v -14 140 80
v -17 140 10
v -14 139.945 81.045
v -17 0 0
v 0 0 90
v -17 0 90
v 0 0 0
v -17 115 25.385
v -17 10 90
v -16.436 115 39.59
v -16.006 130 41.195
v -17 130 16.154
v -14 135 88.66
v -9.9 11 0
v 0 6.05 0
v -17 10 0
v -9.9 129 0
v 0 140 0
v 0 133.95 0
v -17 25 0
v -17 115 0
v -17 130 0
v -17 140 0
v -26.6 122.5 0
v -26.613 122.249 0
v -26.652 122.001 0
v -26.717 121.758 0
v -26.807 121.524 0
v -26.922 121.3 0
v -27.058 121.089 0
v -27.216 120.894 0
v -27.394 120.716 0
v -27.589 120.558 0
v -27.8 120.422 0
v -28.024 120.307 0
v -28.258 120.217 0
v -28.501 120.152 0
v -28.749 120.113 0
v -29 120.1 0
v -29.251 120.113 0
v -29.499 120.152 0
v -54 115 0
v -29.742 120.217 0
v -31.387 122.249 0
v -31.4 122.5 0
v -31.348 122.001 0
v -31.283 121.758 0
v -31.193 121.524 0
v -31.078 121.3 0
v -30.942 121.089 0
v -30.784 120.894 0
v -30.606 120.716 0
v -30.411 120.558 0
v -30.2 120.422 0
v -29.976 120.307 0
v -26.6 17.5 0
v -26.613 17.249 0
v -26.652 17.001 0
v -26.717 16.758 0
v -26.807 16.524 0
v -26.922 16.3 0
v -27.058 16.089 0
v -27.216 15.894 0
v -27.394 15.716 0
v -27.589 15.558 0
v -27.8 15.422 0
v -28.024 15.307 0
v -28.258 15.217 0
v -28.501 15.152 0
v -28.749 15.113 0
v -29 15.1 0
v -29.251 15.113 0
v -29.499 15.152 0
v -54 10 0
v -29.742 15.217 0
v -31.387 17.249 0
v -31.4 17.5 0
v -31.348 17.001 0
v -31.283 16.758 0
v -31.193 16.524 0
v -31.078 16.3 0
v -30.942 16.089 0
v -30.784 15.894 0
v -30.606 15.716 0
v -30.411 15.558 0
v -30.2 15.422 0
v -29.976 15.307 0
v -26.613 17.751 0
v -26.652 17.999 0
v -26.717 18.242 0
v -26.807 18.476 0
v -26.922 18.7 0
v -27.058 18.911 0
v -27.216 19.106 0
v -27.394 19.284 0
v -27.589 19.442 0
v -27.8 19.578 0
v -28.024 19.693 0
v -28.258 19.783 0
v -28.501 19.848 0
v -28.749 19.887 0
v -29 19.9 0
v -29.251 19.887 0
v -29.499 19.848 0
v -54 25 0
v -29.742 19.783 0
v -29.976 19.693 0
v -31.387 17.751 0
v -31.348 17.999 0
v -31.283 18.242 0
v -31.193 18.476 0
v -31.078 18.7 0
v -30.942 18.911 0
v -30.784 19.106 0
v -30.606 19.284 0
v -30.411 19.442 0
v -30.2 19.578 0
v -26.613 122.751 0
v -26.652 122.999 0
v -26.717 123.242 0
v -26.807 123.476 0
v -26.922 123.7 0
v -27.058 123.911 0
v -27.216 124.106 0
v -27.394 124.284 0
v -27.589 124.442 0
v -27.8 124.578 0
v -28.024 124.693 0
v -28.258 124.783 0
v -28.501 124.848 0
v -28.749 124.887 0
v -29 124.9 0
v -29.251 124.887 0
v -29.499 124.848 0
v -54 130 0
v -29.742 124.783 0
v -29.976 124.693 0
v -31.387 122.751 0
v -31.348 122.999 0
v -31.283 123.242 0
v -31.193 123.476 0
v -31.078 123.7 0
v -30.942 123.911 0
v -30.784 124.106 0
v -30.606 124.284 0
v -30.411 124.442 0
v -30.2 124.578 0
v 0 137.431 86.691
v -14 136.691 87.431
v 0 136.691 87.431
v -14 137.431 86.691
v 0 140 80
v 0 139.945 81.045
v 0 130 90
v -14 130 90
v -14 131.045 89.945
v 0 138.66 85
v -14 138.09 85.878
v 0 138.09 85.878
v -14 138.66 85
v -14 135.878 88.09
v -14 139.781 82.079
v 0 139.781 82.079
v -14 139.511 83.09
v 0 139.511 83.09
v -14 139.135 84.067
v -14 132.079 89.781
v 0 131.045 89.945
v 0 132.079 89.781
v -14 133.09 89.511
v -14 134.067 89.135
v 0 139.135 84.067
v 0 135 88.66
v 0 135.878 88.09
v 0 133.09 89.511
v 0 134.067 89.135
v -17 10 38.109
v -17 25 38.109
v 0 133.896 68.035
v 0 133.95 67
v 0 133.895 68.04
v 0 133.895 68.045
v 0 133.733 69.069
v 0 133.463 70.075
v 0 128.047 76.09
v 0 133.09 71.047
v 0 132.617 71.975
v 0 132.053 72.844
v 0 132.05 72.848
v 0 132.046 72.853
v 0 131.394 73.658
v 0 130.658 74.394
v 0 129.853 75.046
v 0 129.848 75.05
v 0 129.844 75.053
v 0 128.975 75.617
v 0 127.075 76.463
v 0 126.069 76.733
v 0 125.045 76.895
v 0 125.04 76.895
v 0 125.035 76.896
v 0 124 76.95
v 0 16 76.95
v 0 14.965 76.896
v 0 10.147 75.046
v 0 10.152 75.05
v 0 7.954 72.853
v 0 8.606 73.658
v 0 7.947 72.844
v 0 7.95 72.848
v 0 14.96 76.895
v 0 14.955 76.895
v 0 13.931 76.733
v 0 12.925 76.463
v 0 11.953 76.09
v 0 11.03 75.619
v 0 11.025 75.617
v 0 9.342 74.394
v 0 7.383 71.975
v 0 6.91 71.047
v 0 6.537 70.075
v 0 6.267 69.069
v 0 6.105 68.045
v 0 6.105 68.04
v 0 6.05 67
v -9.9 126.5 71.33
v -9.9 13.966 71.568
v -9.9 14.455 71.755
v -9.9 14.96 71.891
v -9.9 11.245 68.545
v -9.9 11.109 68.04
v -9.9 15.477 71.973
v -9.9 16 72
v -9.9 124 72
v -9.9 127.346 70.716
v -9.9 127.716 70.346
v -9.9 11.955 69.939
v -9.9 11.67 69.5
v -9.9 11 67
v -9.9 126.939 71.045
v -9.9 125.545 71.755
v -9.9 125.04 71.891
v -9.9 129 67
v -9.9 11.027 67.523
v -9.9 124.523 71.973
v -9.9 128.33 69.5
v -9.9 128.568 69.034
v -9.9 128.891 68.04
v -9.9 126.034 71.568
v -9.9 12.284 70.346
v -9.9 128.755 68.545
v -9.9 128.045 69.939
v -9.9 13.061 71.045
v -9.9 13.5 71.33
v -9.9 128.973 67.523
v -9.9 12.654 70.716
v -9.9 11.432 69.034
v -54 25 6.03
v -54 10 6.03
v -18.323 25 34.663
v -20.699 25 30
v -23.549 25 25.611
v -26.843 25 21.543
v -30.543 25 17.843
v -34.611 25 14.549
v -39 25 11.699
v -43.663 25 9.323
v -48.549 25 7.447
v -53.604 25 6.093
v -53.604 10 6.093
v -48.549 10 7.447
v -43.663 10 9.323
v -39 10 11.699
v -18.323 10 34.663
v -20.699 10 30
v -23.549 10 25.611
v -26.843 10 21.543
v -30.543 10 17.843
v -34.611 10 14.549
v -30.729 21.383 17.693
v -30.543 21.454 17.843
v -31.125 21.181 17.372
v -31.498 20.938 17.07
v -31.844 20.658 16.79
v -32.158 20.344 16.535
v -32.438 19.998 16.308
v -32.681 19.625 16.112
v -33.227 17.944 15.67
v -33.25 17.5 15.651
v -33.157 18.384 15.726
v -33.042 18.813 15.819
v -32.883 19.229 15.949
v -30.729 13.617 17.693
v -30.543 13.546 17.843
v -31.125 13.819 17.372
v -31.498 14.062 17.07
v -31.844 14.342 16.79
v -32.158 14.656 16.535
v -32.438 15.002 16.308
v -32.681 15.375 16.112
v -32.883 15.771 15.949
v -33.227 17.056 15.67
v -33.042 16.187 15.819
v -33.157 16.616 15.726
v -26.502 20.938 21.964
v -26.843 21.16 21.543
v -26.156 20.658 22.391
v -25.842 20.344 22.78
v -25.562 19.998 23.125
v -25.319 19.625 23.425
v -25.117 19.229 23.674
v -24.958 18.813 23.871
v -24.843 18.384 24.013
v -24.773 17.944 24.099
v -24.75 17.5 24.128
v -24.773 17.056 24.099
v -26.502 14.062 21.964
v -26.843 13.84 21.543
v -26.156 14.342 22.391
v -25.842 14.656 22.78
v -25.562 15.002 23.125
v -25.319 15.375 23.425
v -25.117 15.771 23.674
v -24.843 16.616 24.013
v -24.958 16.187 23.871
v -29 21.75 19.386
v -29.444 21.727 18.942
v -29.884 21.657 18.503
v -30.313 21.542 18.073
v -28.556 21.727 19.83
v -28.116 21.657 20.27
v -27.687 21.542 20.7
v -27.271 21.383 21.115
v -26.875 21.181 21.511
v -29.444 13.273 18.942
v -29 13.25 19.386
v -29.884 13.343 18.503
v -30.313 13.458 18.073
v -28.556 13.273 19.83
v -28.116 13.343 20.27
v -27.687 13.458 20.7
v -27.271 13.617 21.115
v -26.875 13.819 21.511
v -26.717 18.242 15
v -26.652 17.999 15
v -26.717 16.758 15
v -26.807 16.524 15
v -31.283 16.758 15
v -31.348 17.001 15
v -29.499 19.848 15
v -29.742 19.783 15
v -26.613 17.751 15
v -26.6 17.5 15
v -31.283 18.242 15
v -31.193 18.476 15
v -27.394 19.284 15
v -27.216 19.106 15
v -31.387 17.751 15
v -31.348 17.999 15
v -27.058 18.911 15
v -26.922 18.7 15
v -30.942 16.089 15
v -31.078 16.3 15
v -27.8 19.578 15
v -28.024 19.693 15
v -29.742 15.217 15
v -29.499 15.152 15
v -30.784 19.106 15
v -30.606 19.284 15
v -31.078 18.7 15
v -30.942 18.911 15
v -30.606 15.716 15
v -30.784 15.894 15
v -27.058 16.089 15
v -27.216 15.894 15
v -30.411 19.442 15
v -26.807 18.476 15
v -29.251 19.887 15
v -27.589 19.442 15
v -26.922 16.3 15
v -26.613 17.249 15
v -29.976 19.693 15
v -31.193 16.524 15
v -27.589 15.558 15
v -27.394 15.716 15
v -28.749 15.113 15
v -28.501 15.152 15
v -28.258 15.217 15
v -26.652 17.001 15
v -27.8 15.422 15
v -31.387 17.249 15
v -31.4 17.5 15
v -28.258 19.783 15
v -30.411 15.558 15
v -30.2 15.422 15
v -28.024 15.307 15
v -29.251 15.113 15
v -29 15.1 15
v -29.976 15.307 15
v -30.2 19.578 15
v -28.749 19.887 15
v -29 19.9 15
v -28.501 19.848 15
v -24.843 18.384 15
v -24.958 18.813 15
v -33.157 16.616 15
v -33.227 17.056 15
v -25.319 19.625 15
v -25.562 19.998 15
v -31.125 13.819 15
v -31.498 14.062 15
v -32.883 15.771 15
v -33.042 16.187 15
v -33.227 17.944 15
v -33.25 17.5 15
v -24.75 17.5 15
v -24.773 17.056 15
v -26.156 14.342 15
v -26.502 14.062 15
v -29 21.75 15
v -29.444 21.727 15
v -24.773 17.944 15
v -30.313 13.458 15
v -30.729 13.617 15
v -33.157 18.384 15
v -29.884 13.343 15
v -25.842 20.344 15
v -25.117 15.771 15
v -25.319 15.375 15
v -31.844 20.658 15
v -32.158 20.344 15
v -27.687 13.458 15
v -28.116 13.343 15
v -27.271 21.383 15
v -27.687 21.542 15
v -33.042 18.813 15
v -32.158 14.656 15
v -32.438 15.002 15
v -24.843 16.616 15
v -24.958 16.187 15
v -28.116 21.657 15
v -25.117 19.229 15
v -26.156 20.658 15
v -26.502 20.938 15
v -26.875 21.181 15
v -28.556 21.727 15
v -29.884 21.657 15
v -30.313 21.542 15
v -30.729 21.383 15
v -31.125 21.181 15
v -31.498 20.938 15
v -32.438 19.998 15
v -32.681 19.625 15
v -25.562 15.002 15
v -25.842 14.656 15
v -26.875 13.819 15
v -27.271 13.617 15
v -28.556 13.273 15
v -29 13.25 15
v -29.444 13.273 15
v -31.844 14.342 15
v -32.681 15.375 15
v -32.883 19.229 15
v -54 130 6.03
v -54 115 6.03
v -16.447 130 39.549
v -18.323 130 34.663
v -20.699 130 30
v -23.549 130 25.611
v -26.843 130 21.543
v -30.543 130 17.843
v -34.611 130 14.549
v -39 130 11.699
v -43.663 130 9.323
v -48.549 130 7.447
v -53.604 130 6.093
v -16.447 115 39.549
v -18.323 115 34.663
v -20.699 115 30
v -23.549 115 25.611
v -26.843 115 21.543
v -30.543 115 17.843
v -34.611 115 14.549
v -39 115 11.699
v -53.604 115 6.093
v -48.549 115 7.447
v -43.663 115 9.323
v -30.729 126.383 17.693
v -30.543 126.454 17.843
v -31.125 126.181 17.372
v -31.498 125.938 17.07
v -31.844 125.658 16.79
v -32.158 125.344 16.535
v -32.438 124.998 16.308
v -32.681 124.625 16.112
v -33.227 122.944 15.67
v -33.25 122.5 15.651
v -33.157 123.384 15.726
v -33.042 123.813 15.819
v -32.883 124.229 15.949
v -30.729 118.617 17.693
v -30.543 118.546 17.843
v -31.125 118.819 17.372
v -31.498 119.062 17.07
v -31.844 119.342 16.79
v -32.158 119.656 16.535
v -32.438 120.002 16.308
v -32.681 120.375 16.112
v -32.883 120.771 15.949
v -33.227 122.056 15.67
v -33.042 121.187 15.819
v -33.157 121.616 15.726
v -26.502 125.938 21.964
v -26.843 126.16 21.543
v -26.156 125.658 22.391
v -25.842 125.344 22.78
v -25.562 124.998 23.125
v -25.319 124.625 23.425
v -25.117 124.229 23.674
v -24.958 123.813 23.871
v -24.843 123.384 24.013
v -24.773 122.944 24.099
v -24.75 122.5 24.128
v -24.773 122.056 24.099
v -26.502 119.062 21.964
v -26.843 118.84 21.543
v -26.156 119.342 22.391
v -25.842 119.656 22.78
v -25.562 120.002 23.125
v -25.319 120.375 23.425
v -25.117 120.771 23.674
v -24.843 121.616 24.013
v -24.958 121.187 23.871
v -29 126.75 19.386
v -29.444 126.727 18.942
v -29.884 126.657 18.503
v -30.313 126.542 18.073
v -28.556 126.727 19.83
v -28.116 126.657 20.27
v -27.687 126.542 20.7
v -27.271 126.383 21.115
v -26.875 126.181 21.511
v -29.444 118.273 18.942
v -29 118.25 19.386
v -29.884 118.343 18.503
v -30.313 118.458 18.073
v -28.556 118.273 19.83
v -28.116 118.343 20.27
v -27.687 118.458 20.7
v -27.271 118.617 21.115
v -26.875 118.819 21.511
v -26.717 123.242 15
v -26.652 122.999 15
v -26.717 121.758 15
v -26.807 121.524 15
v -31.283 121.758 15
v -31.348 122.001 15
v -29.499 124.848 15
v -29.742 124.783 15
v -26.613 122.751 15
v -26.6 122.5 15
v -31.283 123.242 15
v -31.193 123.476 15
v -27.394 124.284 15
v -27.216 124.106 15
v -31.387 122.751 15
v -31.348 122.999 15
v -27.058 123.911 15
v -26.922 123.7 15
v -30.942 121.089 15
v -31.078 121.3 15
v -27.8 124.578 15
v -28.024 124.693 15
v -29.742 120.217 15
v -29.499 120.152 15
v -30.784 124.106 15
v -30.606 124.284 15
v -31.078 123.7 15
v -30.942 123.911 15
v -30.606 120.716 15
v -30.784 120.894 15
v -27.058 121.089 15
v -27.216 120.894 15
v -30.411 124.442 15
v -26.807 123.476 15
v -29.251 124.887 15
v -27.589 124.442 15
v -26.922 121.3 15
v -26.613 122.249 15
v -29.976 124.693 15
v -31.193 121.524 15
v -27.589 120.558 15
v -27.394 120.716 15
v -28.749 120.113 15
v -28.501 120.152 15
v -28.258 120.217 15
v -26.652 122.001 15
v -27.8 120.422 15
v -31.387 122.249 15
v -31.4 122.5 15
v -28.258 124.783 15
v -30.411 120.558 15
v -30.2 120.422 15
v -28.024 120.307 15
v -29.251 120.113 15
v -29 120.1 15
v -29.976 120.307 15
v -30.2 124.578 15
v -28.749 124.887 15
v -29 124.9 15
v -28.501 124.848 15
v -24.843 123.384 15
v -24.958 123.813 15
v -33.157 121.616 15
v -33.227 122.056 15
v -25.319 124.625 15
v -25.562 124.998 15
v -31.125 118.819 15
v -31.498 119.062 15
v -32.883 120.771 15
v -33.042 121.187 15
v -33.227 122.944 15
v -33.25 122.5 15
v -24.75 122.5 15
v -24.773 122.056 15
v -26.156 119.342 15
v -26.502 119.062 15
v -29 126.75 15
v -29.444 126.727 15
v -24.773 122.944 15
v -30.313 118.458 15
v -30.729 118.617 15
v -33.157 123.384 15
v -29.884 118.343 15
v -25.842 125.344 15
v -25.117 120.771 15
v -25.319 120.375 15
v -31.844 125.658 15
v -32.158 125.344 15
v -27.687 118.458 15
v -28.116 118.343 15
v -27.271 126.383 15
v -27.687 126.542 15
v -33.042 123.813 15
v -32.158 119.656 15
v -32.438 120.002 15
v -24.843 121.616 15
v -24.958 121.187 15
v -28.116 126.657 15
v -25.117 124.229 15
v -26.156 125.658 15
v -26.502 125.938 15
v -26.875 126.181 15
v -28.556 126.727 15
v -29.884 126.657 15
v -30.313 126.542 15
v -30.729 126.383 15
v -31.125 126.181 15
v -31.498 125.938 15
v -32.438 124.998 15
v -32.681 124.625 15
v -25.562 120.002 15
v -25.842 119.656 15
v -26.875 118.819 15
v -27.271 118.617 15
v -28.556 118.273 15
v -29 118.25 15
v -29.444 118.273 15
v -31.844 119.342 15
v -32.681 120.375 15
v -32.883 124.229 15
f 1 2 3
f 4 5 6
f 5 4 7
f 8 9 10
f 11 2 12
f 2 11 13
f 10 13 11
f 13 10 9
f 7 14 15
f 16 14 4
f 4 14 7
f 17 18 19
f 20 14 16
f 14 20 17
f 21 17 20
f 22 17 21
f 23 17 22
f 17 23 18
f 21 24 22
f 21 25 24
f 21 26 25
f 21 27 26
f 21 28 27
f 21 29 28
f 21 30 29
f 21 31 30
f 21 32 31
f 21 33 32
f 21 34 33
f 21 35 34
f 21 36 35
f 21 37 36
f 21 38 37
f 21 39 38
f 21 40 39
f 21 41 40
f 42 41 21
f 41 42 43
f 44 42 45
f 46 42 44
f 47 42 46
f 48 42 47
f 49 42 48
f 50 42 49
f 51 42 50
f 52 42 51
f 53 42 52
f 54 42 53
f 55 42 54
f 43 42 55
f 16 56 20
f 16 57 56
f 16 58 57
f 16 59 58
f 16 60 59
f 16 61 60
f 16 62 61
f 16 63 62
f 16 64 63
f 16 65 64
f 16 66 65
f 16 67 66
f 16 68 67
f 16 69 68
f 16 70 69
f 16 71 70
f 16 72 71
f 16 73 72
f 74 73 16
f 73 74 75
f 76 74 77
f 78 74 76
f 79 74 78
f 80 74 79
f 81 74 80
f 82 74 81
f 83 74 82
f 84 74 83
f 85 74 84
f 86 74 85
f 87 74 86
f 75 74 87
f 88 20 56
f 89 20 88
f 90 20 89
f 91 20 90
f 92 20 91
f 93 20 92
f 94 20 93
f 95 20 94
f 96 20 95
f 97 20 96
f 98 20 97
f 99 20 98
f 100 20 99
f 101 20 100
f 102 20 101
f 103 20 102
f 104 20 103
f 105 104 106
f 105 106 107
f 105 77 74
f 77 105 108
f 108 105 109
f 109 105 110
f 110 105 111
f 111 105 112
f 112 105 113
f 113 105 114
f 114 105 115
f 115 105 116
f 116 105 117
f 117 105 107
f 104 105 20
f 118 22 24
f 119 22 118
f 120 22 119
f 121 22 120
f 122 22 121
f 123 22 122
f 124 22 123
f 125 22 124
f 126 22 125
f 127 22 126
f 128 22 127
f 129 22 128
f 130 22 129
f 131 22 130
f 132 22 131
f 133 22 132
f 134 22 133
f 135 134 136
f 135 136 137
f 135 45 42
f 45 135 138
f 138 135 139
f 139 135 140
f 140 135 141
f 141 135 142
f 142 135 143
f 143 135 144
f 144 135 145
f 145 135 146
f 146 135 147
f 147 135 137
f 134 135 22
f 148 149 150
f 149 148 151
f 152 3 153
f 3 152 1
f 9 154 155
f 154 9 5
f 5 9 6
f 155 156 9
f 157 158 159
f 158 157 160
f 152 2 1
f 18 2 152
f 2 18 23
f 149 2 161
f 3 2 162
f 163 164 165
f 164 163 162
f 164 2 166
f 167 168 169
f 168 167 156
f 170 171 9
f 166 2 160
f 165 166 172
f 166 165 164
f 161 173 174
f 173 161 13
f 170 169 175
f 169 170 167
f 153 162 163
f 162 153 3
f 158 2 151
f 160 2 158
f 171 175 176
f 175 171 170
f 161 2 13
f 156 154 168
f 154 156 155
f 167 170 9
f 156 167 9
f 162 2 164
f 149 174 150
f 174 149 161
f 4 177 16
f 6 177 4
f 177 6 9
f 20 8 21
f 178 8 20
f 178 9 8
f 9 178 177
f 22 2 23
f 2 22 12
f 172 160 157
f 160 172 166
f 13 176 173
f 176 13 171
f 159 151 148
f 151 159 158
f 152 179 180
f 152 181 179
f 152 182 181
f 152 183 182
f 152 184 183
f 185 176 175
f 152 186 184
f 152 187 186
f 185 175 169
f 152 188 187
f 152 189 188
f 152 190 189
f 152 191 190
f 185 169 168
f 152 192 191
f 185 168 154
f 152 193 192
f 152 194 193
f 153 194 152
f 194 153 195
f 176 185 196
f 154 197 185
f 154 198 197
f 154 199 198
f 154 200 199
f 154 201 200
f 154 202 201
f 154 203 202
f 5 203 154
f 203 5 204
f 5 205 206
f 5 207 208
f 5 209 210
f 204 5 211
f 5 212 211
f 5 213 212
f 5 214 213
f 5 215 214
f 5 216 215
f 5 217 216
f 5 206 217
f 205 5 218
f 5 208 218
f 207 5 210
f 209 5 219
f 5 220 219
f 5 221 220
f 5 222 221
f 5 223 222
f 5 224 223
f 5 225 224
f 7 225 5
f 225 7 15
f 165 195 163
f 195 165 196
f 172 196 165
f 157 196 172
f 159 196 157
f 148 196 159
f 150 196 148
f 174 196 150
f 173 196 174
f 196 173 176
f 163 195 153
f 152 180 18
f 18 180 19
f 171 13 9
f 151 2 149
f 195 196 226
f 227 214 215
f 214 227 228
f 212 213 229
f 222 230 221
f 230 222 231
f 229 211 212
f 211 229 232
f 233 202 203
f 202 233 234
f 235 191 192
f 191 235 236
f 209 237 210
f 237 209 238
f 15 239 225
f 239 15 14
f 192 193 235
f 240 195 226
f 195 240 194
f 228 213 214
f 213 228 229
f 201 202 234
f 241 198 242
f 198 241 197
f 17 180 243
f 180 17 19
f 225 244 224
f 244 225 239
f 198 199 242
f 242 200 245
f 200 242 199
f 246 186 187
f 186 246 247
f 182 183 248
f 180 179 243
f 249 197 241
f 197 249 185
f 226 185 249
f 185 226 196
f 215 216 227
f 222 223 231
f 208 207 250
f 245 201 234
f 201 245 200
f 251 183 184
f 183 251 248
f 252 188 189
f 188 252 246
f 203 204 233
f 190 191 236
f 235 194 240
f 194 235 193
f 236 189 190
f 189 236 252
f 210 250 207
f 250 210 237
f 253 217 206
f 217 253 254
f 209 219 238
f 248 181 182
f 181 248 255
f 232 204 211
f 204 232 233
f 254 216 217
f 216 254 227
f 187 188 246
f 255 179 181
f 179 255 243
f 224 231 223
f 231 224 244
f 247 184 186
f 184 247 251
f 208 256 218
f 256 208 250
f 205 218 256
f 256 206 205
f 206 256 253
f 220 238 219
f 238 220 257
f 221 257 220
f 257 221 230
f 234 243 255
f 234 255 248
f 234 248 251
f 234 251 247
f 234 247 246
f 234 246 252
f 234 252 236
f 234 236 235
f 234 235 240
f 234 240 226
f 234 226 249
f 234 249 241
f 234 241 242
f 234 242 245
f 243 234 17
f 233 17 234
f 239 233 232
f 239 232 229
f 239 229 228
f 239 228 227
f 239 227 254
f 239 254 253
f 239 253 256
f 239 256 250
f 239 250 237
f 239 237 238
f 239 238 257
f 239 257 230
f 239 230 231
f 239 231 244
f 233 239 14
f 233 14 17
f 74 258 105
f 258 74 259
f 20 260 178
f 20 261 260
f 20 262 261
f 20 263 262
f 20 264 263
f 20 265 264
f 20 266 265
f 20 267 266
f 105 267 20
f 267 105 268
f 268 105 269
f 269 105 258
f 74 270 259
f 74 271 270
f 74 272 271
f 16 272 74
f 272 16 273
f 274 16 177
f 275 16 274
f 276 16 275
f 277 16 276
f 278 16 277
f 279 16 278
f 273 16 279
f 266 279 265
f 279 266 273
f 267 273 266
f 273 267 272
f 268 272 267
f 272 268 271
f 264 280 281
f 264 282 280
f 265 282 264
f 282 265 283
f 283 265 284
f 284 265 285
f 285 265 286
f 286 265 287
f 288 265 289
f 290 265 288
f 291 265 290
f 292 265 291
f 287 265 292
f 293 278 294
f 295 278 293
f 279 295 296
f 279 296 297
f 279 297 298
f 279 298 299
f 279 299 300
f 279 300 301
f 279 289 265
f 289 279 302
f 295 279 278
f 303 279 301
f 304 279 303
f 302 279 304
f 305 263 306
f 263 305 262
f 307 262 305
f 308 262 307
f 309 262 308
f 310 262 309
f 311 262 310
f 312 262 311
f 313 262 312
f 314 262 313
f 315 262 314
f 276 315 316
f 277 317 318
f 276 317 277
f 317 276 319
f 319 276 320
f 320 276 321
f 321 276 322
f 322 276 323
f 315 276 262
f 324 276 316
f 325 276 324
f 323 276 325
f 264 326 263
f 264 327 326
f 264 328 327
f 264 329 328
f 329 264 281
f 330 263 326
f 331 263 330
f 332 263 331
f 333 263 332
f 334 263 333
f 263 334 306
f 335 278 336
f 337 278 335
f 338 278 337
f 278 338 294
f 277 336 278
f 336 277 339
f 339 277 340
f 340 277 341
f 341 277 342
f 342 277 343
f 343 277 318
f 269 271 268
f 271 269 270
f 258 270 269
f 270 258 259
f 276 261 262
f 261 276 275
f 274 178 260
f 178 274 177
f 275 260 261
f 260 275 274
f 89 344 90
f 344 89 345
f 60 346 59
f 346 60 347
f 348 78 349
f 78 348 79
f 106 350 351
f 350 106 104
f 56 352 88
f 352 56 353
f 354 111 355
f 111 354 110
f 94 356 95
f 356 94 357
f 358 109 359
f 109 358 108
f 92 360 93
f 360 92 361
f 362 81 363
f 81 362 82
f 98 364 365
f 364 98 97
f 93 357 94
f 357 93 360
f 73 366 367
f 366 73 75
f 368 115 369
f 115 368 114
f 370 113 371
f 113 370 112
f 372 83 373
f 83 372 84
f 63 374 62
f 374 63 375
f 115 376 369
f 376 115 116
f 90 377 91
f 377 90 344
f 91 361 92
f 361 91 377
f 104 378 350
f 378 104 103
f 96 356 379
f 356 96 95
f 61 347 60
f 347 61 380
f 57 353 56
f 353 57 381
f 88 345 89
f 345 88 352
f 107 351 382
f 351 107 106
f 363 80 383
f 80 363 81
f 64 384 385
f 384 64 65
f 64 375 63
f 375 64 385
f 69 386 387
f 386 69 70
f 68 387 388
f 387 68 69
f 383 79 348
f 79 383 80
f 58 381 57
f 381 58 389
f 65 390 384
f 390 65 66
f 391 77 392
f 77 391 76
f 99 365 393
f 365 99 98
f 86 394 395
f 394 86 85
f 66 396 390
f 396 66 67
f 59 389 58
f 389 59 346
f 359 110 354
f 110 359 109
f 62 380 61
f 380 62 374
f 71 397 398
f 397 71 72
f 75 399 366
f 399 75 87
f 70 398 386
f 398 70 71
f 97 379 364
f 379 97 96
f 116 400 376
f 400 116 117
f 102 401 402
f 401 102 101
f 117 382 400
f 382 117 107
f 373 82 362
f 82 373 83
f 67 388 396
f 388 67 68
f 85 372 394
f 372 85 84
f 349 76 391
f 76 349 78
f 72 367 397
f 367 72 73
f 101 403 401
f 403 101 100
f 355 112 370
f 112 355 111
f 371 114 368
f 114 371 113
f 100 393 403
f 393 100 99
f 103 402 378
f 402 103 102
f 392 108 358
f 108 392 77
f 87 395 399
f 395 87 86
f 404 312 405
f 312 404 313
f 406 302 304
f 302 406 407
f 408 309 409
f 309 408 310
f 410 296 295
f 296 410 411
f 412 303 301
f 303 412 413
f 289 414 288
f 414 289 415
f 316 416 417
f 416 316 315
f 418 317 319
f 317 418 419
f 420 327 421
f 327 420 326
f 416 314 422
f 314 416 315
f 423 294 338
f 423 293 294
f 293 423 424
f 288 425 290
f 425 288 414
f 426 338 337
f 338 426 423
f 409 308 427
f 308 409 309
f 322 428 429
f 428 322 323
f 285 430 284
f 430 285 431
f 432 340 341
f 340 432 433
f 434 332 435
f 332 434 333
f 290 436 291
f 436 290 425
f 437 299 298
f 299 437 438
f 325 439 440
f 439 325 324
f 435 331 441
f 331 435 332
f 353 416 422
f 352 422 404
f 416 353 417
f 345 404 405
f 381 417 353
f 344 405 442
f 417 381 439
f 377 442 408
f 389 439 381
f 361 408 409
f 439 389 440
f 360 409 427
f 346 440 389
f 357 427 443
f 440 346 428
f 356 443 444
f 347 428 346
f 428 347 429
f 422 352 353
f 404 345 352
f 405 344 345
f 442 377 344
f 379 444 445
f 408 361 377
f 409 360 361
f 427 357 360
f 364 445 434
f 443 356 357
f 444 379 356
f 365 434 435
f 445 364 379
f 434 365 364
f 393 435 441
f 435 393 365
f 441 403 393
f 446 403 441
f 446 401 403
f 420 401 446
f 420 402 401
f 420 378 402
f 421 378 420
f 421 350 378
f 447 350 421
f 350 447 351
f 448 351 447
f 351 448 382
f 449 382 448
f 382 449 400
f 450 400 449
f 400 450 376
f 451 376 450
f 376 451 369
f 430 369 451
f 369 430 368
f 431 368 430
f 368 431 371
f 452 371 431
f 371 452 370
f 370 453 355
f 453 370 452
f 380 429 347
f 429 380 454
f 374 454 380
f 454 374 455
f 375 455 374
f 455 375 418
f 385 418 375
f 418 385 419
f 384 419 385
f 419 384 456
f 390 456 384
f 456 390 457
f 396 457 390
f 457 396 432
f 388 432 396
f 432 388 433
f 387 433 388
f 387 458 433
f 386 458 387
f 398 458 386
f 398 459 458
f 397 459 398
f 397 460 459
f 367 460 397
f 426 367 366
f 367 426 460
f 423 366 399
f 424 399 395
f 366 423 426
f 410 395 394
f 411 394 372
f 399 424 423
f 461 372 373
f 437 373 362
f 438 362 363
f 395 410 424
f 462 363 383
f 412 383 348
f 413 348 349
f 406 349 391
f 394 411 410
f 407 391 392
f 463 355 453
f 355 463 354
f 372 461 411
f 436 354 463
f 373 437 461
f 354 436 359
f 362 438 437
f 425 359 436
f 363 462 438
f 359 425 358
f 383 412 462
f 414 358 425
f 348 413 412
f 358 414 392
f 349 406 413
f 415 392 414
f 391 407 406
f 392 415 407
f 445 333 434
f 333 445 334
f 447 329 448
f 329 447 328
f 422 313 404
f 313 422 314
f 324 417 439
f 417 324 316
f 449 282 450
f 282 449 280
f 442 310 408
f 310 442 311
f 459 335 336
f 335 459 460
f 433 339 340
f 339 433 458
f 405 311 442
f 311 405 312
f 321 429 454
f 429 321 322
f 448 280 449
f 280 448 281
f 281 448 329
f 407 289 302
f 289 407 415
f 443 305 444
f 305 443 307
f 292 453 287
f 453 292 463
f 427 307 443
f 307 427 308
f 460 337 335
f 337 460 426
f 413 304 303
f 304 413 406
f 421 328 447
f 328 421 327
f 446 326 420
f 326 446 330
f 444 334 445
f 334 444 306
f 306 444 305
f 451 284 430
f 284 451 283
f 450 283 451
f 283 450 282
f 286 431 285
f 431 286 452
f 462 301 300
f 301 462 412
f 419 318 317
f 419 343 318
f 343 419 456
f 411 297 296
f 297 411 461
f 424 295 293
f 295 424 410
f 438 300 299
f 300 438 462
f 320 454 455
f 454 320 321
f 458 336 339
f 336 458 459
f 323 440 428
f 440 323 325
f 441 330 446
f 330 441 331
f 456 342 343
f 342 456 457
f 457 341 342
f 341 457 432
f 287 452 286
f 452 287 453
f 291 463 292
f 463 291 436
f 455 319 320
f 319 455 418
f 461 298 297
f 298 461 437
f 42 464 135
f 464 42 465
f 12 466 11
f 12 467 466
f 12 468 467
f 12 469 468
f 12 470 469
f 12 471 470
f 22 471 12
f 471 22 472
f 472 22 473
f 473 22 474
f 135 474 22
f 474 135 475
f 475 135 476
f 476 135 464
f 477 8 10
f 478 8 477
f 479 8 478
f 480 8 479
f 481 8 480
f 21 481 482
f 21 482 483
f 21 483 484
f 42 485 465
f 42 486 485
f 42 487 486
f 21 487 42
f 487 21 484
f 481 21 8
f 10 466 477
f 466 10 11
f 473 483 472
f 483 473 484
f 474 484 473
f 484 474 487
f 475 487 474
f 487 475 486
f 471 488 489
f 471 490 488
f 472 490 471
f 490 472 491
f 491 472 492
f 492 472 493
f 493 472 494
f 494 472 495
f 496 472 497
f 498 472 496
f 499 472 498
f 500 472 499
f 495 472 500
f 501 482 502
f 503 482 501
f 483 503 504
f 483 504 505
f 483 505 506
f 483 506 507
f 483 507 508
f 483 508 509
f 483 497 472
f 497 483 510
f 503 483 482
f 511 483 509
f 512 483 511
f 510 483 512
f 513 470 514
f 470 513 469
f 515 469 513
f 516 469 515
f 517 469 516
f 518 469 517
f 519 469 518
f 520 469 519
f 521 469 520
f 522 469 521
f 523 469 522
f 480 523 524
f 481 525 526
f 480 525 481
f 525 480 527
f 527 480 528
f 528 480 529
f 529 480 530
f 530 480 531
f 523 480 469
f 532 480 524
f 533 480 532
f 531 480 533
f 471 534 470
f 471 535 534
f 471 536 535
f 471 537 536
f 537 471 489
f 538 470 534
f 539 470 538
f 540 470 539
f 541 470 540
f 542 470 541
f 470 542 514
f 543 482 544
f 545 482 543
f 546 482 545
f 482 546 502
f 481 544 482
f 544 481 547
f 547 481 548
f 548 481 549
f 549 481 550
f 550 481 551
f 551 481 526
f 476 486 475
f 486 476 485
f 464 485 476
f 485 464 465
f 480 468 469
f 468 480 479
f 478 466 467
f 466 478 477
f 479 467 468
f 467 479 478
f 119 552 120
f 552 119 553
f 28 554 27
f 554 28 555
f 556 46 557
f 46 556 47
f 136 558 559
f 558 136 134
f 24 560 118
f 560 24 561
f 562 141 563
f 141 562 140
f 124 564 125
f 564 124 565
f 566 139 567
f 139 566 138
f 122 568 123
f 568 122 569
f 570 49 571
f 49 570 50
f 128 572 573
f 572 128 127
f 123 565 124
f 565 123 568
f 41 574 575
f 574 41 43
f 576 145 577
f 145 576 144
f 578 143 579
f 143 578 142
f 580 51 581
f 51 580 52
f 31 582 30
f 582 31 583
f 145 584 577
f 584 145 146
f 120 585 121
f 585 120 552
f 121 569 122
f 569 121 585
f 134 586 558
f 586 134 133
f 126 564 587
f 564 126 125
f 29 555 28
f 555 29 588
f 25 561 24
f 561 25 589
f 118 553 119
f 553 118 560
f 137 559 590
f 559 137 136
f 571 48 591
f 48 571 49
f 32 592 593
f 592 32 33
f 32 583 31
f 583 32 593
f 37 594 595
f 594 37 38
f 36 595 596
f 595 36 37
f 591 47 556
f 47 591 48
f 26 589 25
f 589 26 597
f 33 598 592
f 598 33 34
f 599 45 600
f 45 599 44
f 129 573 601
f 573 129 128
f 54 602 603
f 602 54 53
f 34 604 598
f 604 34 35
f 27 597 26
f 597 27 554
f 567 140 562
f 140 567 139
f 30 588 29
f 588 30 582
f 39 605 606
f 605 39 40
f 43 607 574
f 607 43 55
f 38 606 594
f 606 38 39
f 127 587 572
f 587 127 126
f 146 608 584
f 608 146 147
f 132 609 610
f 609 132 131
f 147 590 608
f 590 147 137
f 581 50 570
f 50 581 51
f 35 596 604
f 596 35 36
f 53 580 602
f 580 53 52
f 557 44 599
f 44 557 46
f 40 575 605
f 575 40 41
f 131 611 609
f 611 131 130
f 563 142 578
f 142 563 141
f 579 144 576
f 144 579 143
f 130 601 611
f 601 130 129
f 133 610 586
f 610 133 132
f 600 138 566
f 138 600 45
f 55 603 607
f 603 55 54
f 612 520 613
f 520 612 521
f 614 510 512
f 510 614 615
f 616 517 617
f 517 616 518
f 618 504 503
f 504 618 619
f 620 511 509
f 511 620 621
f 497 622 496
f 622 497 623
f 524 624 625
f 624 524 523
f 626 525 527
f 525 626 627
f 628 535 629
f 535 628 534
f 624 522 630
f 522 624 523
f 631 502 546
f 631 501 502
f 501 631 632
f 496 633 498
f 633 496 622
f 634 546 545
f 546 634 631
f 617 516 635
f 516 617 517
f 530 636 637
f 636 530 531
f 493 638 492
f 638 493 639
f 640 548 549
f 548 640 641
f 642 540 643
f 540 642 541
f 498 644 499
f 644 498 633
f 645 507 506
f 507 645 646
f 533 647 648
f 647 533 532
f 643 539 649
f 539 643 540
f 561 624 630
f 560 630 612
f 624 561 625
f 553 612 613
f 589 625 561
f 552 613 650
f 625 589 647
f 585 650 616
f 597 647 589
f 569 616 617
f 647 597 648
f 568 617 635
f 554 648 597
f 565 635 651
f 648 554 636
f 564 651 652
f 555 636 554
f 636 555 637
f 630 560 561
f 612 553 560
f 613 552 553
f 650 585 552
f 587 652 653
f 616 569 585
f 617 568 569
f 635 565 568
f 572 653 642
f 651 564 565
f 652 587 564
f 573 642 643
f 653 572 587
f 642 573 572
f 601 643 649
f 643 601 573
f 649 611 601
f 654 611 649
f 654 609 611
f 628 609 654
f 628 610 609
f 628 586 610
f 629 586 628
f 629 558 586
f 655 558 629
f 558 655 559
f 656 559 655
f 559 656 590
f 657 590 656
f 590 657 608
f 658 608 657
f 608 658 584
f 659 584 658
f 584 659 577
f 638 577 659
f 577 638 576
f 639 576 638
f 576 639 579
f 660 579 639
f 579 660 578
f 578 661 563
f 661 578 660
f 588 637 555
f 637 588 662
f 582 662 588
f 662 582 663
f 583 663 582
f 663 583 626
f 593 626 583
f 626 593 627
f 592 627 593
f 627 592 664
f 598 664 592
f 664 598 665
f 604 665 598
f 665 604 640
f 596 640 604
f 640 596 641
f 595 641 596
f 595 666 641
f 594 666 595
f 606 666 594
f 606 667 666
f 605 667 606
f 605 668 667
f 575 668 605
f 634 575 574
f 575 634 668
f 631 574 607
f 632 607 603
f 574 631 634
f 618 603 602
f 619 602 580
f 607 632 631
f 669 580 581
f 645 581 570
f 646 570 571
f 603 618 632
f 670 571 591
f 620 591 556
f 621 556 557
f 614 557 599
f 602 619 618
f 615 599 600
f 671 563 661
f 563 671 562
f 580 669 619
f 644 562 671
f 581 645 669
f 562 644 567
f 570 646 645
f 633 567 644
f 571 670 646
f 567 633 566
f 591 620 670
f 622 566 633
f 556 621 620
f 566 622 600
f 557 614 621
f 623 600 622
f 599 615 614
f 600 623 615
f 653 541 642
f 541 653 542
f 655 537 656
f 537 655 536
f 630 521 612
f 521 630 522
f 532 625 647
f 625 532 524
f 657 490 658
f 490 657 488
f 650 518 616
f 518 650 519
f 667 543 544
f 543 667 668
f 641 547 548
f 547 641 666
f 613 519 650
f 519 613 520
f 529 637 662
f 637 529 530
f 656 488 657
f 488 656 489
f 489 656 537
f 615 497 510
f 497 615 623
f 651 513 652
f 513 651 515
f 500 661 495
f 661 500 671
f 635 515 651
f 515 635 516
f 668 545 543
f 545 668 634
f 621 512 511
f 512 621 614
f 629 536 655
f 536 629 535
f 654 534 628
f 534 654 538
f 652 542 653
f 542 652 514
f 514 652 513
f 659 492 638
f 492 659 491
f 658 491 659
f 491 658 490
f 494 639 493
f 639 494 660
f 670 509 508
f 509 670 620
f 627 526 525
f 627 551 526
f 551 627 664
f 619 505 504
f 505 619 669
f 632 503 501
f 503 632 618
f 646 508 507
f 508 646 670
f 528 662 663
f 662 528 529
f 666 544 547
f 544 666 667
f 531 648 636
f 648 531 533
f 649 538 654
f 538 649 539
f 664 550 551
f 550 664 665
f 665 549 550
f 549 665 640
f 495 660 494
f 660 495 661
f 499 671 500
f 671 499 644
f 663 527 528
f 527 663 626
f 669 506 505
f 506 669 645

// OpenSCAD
/* 
 * Parametric Shelf with Brackets and Round Corners
 * Copyright (C) 2018
 * License: CC-BY-SA
 */

/* shelf dimensions */
$height = 17;
$front_height = 14;
$width = 140;
$depth = 90;

/* braket dimensions */
$bracket_offset = 10;
$bracket_height = 40;
$bracket_width = 15;
$bracket_length = 50;
$bracket_hole_height = 15;

/* inset and corners */
$corner_radius = 10;
$round_left_corner = 0;
$round_right_corner = 1;
$inset_width = 10;
$inset_padding = 6;

$fn = 60;

module bracket() {
    difference() {
        cube([$bracket_length, $bracket_width, $bracket_height]);
        
        translate([$bracket_length+5, $bracket_width + 0.1, $bracket_height+10])
        rotate([90, 0, 0])
        cylinder(h=$bracket_width+1, r=$bracket_height+10);

        translate([-0.1, $bracket_width / 2, $bracket_hole_height])
        rotate([0, 90, 0])
        cylinder(r=2.4, h=30);

        translate([15, $bracket_width / 2, $bracket_hole_height])
        rotate([0, 90, 0])
        cylinder(r=4.25, h=30);
    }
}

module shelf() {
    difference() {
        hull() {
            cube([$corner_radius, $width, $height]);

            translate([$depth-$corner_radius, $corner_radius * $round_left_corner, 0])
            if ($round_left_corner) {
                cylinder(h=$front_height, r=$corner_radius);
            } else {
                cube([10, $corner_radius, $height]);
            }
            
            translate([$depth-$corner_radius, $width-$corner_radius, 0])
            if ($round_right_corner) {
                cylinder(h=$front_height, r=$corner_radius);
            } else {
                cube([$corner_radius, $corner_radius, $height]);
            }
        }
        
        translate([0, 0, -0.1])
        hull() {
            translate([0, $inset_padding+$corner_radius, 0])
                cylinder(h=$inset_width, r1=$corner_radius, r2=$corner_radius/2);
     
            translate([0, $width-$inset_padding-$corner_radius, 0])
                cylinder(h=$inset_width, r1=$corner_radius, r2=$corner_radius/2);
        
            translate([77 - $corner_radius, $inset_padding+$corner_radius, 0])
                cylinder(h=$inset_width, r1=$corner_radius, r2=$corner_radius/2);

            translate([77 - $corner_radius, $width-$inset_padding-$corner_radius, 0])
                cylinder(h=$inset_width, r1=$corner_radius, r2=$corner_radius/2);
        }
    }

    translate([0, $bracket_offset, $front_height])
        bracket();

    translate([0, $width-$bracket_offset-$bracket_width, $front_height])
        bracket();
}

rotate([0, -90, 0])
shelf();
